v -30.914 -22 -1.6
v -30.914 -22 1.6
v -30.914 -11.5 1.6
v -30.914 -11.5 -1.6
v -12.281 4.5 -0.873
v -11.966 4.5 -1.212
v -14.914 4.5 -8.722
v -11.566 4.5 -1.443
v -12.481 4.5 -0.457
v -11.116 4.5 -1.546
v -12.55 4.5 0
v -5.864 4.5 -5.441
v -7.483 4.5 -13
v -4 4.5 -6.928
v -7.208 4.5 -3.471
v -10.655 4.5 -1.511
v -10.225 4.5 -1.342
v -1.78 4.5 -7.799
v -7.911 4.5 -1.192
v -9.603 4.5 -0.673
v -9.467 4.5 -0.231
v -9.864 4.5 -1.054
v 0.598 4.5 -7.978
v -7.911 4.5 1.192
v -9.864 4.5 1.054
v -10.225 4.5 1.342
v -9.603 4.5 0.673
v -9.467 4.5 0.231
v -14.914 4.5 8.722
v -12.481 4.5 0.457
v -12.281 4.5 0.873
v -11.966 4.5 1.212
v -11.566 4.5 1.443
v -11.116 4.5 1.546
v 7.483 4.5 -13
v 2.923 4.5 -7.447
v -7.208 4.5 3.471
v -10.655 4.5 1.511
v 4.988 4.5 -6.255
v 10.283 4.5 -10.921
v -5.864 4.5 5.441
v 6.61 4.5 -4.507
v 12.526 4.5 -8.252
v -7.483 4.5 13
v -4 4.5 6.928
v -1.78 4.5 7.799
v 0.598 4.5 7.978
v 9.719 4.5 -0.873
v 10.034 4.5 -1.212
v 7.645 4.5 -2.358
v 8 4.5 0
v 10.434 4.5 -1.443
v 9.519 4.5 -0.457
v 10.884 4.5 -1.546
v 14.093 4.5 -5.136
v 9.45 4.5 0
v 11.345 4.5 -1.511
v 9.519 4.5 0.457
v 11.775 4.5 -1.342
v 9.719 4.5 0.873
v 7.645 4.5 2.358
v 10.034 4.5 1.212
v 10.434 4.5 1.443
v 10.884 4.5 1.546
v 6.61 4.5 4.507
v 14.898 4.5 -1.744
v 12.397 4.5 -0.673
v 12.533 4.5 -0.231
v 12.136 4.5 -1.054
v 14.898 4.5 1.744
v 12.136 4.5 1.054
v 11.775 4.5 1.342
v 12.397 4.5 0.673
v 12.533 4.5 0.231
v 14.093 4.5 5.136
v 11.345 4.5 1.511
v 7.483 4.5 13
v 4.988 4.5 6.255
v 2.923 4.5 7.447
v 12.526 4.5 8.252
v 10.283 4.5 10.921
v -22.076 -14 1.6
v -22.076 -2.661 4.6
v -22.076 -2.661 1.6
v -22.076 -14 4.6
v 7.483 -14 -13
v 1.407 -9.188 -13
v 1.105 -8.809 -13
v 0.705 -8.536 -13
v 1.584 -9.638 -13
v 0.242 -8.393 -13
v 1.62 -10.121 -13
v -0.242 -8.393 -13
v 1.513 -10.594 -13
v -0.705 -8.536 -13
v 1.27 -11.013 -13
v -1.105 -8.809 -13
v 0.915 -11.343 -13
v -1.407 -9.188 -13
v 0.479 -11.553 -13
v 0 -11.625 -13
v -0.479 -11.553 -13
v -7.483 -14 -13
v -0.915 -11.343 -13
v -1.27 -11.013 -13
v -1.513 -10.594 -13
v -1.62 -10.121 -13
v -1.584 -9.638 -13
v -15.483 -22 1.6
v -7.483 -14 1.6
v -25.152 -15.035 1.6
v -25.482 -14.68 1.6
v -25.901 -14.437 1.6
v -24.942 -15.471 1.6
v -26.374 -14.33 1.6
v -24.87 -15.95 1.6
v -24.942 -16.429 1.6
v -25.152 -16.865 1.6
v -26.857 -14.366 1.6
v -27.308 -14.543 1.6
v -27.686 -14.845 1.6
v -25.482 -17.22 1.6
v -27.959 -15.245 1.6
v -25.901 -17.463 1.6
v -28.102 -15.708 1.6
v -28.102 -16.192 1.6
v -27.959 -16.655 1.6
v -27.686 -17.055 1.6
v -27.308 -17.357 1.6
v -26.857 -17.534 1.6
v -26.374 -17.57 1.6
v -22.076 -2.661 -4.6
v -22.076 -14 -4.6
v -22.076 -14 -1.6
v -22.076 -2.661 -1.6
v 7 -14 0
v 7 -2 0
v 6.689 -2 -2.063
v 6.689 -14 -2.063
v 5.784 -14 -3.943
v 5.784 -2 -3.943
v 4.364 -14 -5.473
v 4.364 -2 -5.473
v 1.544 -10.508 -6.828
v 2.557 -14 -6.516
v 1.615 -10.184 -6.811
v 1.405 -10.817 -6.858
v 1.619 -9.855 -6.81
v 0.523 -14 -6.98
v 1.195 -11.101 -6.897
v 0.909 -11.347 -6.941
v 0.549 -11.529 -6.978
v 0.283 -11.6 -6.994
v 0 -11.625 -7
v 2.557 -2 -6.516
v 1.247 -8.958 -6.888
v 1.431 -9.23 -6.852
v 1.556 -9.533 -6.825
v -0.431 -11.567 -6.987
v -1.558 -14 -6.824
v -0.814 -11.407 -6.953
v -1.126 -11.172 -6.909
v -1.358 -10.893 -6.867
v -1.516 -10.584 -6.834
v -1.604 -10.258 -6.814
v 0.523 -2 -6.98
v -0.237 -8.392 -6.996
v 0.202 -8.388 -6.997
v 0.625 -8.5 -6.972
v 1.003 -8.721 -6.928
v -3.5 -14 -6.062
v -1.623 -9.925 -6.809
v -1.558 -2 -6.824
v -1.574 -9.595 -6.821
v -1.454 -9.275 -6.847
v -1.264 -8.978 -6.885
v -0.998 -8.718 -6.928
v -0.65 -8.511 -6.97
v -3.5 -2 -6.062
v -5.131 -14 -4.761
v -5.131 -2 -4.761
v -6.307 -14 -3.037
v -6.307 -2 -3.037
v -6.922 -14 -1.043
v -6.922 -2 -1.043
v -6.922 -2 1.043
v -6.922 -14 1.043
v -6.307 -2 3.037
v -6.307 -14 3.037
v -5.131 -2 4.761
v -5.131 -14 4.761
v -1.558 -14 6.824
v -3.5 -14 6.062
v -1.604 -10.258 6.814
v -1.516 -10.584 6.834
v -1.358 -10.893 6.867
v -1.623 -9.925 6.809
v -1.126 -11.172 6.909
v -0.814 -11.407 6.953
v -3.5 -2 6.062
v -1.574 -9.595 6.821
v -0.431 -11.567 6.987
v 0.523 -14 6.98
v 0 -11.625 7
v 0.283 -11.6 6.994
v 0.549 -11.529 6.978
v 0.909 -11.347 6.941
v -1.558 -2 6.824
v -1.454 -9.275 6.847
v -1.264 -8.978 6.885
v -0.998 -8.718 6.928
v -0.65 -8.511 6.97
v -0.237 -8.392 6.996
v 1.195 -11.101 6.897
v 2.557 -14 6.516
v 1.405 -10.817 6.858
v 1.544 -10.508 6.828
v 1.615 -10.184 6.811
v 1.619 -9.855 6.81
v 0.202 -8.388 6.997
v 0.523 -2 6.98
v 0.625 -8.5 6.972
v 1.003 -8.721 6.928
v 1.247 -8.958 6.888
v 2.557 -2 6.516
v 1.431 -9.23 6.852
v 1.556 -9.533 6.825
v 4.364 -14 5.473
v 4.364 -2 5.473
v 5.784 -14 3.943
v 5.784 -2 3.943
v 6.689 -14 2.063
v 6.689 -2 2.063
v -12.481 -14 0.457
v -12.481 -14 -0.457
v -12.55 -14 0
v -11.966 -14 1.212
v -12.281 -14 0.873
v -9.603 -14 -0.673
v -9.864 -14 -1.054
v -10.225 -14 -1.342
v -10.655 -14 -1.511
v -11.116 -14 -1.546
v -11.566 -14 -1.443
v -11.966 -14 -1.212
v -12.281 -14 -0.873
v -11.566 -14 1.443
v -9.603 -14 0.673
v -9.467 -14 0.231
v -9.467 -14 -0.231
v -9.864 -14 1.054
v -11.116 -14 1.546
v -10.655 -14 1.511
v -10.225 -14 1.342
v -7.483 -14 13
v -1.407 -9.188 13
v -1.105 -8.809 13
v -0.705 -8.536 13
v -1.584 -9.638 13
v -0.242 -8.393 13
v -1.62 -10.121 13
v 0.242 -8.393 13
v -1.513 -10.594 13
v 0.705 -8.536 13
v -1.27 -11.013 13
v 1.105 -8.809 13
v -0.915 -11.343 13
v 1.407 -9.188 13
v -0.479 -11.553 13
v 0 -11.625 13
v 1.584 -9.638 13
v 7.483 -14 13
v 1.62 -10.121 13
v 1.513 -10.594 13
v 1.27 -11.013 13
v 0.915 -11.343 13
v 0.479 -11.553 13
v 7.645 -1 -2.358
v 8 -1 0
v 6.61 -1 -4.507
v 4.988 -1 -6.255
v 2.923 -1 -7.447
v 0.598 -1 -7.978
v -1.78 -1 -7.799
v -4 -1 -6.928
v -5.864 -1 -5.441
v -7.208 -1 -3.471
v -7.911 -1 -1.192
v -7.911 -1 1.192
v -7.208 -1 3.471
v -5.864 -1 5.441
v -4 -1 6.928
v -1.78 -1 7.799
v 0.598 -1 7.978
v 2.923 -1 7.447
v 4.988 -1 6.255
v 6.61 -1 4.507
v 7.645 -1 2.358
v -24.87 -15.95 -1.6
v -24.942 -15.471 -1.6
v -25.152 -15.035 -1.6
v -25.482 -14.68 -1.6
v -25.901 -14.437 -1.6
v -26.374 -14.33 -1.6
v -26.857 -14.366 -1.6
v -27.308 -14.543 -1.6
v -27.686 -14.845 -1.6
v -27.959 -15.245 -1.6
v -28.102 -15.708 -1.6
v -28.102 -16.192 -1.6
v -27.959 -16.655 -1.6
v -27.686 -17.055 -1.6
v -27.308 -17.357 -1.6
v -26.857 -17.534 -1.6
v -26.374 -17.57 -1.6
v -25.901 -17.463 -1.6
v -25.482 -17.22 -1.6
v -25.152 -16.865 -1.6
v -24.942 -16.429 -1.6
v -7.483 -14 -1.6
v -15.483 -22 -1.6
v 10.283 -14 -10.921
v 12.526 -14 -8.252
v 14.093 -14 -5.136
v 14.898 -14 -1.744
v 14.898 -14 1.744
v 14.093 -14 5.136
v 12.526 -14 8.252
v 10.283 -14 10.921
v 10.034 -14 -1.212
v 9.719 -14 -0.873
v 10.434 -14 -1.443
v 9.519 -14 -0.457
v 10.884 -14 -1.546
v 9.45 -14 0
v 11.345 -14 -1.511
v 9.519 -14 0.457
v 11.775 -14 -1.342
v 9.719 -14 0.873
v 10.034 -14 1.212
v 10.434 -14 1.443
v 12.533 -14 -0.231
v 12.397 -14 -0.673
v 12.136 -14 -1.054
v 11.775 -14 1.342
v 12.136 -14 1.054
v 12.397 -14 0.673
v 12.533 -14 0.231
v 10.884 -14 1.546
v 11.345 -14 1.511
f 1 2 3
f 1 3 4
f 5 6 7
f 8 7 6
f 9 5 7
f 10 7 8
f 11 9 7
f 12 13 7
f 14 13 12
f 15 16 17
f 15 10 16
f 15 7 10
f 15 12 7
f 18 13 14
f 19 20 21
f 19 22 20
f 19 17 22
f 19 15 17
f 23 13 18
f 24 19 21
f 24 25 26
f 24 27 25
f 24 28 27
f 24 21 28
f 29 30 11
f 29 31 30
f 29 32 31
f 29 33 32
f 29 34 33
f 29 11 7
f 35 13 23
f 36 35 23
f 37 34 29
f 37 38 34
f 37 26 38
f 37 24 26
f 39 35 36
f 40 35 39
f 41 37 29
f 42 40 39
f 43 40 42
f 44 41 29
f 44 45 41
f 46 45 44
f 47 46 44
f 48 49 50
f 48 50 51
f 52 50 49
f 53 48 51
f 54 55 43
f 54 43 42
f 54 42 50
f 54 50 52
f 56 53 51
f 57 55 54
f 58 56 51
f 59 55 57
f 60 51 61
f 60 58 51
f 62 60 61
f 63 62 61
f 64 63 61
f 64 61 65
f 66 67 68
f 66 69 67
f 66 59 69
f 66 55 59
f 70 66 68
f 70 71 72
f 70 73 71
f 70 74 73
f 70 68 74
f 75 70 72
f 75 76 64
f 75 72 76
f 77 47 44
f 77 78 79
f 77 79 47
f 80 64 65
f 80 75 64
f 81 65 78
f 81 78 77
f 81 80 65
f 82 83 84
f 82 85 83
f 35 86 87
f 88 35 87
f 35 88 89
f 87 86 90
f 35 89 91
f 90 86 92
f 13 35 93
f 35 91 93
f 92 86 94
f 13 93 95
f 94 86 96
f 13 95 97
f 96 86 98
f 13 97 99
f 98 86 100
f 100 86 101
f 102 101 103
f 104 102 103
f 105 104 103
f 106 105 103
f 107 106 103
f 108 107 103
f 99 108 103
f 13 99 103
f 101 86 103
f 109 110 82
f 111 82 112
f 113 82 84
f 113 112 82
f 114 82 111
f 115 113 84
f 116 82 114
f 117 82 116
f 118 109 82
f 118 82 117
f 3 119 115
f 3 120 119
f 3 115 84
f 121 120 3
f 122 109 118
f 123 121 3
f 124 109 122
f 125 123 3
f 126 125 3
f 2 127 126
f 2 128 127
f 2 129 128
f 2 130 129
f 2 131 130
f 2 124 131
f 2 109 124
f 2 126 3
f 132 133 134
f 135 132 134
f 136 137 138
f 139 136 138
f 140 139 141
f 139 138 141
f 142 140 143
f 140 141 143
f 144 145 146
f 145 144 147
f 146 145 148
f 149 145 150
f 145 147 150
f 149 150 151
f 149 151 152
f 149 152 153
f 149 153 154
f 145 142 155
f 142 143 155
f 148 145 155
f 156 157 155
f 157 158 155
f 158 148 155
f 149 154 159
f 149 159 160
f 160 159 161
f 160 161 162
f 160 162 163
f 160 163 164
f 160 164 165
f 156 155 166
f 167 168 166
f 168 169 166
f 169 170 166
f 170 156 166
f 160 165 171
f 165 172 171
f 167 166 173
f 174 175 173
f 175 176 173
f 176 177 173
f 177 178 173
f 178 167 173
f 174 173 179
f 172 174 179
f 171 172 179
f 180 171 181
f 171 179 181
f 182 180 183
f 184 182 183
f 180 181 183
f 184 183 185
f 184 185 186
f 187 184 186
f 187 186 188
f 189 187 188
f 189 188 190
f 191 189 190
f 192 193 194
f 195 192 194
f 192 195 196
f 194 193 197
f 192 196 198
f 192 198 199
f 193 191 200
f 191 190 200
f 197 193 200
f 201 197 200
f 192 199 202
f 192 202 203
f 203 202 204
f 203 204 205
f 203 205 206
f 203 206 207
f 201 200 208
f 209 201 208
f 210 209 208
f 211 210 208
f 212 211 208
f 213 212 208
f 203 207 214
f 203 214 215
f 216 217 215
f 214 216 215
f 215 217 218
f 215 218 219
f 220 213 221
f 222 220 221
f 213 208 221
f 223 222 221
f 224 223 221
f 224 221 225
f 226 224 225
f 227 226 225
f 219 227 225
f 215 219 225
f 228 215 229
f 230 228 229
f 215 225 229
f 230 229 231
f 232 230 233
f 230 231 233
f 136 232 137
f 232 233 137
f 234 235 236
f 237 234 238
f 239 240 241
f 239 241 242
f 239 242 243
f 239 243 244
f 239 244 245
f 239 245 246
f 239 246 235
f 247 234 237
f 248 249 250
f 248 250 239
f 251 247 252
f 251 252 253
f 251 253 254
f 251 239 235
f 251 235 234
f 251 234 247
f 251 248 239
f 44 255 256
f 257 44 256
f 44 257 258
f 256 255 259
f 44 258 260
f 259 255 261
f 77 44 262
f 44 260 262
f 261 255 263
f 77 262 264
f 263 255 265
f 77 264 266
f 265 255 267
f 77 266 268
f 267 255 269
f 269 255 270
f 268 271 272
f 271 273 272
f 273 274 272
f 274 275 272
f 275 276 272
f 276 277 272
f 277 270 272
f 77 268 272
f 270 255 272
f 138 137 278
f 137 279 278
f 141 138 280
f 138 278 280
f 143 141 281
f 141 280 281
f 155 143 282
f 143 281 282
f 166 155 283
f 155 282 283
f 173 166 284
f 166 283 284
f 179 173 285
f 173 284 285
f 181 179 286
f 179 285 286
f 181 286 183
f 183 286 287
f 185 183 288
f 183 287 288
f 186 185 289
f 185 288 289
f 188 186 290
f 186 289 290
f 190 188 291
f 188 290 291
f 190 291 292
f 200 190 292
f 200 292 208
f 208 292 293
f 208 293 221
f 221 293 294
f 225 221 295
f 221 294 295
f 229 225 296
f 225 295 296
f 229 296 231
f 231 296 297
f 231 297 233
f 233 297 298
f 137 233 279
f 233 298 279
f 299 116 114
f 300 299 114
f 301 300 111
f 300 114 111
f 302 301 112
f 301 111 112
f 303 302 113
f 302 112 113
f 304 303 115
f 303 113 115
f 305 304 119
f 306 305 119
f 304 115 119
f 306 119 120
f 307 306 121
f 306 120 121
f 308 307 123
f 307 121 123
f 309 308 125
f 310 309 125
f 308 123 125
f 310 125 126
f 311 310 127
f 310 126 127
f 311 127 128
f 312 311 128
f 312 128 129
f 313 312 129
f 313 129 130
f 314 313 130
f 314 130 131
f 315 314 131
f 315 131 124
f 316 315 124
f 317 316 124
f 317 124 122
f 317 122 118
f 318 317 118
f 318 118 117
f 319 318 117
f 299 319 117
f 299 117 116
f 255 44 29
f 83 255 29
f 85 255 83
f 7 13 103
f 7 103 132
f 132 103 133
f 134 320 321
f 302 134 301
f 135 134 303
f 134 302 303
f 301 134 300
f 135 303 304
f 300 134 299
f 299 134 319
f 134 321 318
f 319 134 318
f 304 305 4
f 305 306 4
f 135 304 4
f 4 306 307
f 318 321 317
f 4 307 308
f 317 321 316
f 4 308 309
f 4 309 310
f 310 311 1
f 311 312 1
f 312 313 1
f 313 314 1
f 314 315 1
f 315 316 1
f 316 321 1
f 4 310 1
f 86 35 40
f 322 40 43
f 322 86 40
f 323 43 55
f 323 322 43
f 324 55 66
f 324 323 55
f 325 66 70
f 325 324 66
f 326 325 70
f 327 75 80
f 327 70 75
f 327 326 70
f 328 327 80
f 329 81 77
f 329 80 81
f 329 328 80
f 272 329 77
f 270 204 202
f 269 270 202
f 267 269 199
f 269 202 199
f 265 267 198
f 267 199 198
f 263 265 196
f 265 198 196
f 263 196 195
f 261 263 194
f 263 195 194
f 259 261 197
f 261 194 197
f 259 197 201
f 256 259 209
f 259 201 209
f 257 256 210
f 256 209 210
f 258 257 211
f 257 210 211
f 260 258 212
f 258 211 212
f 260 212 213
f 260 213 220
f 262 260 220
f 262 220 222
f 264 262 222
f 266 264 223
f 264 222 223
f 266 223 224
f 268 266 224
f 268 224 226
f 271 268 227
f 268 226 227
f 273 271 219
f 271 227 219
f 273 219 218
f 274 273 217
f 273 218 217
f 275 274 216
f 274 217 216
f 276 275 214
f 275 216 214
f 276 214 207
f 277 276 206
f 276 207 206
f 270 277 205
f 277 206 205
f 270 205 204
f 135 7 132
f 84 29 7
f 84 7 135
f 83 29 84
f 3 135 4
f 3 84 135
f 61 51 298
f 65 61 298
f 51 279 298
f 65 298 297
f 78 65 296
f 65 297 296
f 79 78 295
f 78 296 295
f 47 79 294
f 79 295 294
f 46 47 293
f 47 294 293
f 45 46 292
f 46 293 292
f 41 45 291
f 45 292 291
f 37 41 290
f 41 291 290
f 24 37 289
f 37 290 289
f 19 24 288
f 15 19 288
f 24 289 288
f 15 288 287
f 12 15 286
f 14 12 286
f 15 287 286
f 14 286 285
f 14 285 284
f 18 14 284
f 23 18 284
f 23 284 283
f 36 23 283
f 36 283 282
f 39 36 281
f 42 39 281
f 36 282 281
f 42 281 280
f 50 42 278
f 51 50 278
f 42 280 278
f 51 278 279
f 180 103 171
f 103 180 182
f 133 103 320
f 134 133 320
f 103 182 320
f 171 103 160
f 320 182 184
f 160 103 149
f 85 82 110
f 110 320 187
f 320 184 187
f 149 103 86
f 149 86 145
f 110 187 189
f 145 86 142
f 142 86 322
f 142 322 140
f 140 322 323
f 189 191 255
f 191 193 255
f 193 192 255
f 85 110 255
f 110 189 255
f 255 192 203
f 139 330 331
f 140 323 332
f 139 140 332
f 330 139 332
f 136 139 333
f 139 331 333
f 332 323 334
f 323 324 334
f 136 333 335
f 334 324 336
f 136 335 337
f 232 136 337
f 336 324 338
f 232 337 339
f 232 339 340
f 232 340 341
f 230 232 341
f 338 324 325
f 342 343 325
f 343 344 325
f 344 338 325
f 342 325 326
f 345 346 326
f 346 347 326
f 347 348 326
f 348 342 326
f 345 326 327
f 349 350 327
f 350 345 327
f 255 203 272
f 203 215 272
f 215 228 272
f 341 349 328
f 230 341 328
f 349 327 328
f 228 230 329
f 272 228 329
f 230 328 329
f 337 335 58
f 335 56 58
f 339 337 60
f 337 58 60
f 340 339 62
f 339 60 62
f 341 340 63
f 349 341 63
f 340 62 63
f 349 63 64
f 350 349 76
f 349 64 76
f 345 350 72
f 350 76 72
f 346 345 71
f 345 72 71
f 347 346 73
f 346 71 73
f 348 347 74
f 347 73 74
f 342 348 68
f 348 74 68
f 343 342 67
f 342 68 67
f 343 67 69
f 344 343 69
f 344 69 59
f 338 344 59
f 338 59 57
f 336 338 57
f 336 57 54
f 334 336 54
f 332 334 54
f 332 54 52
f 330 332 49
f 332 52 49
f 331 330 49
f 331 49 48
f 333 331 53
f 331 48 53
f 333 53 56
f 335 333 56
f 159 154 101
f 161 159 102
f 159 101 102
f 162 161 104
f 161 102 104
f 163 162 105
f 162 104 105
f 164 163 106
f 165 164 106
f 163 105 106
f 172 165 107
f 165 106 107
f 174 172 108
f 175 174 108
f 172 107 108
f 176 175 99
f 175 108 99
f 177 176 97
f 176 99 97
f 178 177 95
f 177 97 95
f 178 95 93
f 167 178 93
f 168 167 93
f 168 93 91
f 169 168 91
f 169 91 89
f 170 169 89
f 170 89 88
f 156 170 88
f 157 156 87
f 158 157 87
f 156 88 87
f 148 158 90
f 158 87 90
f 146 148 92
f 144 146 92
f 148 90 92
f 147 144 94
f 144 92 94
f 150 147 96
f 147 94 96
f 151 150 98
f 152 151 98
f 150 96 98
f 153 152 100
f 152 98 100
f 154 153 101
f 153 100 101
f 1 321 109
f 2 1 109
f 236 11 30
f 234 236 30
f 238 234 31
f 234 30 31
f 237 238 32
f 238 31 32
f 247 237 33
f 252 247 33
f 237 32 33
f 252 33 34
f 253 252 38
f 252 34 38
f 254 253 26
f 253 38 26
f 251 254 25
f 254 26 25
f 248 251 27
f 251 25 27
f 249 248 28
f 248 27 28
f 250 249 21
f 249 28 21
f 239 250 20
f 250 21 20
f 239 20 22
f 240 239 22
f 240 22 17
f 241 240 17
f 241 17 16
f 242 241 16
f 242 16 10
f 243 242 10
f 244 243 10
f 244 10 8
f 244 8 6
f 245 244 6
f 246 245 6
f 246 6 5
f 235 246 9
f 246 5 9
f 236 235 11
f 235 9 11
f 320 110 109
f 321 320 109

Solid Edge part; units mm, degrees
sketch "Sketch1" plane through (0, 0, 0) normal (0, -1, 0) x (1, 0, 0)
  arc A0 (-7.4833, -13) -> (-7.4833, 13) centre (0, 0) cw
  line L0 (-7.4833, 13) -> (7.4833, 13)
  arc A1 (7.4833, 13) -> (7.4833, -13) centre (0, 0) cw
  line L1 (7.4833, -13) -> (-7.4833, -13)
  circle A2 centre (0, 0) radius 8
extrude "Protrusion1" add sketch "Sketch1" against normal blind 4.5
sketch "Sketch2" plane through (0, 0, 0) normal (0, -1, 0) x (1, 0, 0)
  line L0 (-7.4833, 13) -> (7.4833, 13)
  line L1 (-7.4833, -13) -> (7.4833, -13)
  arc A0 (-7.4833, -13) -> (-7.4833, 13) centre (0, 0) cw
  arc A1 (7.4833, 13) -> (7.4833, -13) centre (0, 0) cw
  circle A2 centre (0, 0) radius 7
extrude "ExtrudedProtrusion_2" add sketch "Sketch2" along normal blind 14
sketch "Sketch3" plane through (0, -14, 0) normal (0, -1, 0) x (1, 0, 0)
  line L0 (-7.4833, 13) -> (-22.0758, 4.6)
  line L1 (-22.0758, 4.6) -> (-22.0758, 1.6)
  line L2 (-22.0758, 1.6) -> (-30.9144, 1.6)
  line L3 (-30.9144, 1.6) -> (-30.9144, -1.6)
  line L4 (-22.0758, -1.6) -> (-30.9144, -1.6)
  line L5 (-22.0758, -4.6) -> (-22.0758, -1.6)
  line L6 (-7.4833, -13) -> (-22.0758, -4.6)
  line L7 (-7.4833, 13) -> (7.4833, 13)
extrude "Protrusion2" add sketch "Sketch3" against normal up to vertex (18.5 mm away) material side at (-14.7546, -14, 8.7567)
sketch "Sketch4" plane through (-2.3218, 4.5, 0) normal (0, 1, 0) x (-1, 0, 0)
  circle A0 centre (-13.3218, 0) radius 1.55
  circle A1 centre (8.6782, 0) radius 1.55
extrude "ExtrudedCutout_7" cut sketch "Sketch4" against normal blind 24
chamfer "Chamfer_4" distance 2 angle 45 1 edges at (-7, 0, 0) measured on face at (-5.1733, 0, -5.4933)
sketch "Sketch5" plane through (0, -4.75, -13) normal (0, 0, -1) x (0, -1, 0)
  circle A0 centre (5.25, 0) radius 1.625
extrude "ExtrudedCutout_10" cut sketch "Sketch5" against normal blind 36
sketch "Sketch6" plane through (-7.9572, -14, 0) normal (0, -1, 0) x (1, 0, 0)
  line L0 (-14.1186, 4.6) -> (0.4739, 13)
  line L1 (0.4739, 13) -> (15.4405, 13)
  line L2 (0.4265, -12.9726) -> (15.4405, -13)
  line L3 (-14.1186, -4.6) -> (0.4265, -12.9726)
  line L4 (-14.1186, -4.6) -> (-14.1186, -1.6)
  line L5 (-22.9572, -1.6) -> (-14.1186, -1.6)
  line L6 (-22.9572, -1.6) -> (-22.9572, 1.6)
  line L7 (-22.9572, 1.6) -> (-14.1186, 1.6)
  line L8 (-14.1186, 4.6) -> (-14.1186, 1.6)
  arc A0 (15.4405, 13) -> (15.4405, -13) centre (7.9572, 0) cw
  circle A1 centre (7.9572, 0) radius 7
extrude "ExtrudedProtrusion_7" add sketch "Sketch6" along normal blind 8
sketch "Sketch7" plane through (0, -8.75, 13) normal (0, 0, 1) x (0, 1, 0)
  line L0 (-13.25, 15.4833) -> (-13.25, 7.4833)
  line L1 (-13.25, 7.4833) -> (-13.25, -15)
  line L2 (-13.25, -15) -> (-5.25, -15)
  line L3 (-5.25, -15) -> (-5.25, 7.4833)
  line L4 (-5.25, 7.4833) -> (-13.25, 15.4833)
  line L5 (13.25, 14.9144) -> (-2.75, 30.9144)
  line L6 (-2.75, 30.9144) -> (13.25, 30.9144)
  line L7 (13.25, 30.9144) -> (13.25, 14.9144)
extrude "ExtrudedCutout_15" cut sketch "Sketch7" against normal blind 35.2747
sketch "Sketch8" plane through (-26.4951, -12.3307, 1.6) normal (0, 0, 1) x (1, 0, 0)
  circle A0 centre (0, -3.6193) radius 1.625
extrude "ExtrudedCutout_18" cut sketch "Sketch8" against normal blind 7.2202
sketch "Sketch9" plane through (-22.0758, -12.3307, -3.1025) normal (-1, 0, 0) x (0, -1, 0)
  line L0 (9.6693, 4.7025) -> (1.6693, 4.7025)
  line L1 (1.6693, 4.7025) -> (1.6693, 16.1025)
  line L2 (1.6693, 16.1025) -> (9.6693, 16.1025)
  line L3 (9.6693, 16.1025) -> (9.6693, 4.7025)
  line L4 (9.6693, 1.5025) -> (1.6693, 1.5025)
  line L5 (1.6693, 1.5025) -> (1.6693, -9.8975)
  line L6 (1.6693, -9.8975) -> (9.6693, -9.8975)
  line L7 (9.6693, -9.8975) -> (9.6693, 1.5025)
extrude "ExtrudedCutout_19" cut sketch "Sketch9" against normal blind 19.6868
